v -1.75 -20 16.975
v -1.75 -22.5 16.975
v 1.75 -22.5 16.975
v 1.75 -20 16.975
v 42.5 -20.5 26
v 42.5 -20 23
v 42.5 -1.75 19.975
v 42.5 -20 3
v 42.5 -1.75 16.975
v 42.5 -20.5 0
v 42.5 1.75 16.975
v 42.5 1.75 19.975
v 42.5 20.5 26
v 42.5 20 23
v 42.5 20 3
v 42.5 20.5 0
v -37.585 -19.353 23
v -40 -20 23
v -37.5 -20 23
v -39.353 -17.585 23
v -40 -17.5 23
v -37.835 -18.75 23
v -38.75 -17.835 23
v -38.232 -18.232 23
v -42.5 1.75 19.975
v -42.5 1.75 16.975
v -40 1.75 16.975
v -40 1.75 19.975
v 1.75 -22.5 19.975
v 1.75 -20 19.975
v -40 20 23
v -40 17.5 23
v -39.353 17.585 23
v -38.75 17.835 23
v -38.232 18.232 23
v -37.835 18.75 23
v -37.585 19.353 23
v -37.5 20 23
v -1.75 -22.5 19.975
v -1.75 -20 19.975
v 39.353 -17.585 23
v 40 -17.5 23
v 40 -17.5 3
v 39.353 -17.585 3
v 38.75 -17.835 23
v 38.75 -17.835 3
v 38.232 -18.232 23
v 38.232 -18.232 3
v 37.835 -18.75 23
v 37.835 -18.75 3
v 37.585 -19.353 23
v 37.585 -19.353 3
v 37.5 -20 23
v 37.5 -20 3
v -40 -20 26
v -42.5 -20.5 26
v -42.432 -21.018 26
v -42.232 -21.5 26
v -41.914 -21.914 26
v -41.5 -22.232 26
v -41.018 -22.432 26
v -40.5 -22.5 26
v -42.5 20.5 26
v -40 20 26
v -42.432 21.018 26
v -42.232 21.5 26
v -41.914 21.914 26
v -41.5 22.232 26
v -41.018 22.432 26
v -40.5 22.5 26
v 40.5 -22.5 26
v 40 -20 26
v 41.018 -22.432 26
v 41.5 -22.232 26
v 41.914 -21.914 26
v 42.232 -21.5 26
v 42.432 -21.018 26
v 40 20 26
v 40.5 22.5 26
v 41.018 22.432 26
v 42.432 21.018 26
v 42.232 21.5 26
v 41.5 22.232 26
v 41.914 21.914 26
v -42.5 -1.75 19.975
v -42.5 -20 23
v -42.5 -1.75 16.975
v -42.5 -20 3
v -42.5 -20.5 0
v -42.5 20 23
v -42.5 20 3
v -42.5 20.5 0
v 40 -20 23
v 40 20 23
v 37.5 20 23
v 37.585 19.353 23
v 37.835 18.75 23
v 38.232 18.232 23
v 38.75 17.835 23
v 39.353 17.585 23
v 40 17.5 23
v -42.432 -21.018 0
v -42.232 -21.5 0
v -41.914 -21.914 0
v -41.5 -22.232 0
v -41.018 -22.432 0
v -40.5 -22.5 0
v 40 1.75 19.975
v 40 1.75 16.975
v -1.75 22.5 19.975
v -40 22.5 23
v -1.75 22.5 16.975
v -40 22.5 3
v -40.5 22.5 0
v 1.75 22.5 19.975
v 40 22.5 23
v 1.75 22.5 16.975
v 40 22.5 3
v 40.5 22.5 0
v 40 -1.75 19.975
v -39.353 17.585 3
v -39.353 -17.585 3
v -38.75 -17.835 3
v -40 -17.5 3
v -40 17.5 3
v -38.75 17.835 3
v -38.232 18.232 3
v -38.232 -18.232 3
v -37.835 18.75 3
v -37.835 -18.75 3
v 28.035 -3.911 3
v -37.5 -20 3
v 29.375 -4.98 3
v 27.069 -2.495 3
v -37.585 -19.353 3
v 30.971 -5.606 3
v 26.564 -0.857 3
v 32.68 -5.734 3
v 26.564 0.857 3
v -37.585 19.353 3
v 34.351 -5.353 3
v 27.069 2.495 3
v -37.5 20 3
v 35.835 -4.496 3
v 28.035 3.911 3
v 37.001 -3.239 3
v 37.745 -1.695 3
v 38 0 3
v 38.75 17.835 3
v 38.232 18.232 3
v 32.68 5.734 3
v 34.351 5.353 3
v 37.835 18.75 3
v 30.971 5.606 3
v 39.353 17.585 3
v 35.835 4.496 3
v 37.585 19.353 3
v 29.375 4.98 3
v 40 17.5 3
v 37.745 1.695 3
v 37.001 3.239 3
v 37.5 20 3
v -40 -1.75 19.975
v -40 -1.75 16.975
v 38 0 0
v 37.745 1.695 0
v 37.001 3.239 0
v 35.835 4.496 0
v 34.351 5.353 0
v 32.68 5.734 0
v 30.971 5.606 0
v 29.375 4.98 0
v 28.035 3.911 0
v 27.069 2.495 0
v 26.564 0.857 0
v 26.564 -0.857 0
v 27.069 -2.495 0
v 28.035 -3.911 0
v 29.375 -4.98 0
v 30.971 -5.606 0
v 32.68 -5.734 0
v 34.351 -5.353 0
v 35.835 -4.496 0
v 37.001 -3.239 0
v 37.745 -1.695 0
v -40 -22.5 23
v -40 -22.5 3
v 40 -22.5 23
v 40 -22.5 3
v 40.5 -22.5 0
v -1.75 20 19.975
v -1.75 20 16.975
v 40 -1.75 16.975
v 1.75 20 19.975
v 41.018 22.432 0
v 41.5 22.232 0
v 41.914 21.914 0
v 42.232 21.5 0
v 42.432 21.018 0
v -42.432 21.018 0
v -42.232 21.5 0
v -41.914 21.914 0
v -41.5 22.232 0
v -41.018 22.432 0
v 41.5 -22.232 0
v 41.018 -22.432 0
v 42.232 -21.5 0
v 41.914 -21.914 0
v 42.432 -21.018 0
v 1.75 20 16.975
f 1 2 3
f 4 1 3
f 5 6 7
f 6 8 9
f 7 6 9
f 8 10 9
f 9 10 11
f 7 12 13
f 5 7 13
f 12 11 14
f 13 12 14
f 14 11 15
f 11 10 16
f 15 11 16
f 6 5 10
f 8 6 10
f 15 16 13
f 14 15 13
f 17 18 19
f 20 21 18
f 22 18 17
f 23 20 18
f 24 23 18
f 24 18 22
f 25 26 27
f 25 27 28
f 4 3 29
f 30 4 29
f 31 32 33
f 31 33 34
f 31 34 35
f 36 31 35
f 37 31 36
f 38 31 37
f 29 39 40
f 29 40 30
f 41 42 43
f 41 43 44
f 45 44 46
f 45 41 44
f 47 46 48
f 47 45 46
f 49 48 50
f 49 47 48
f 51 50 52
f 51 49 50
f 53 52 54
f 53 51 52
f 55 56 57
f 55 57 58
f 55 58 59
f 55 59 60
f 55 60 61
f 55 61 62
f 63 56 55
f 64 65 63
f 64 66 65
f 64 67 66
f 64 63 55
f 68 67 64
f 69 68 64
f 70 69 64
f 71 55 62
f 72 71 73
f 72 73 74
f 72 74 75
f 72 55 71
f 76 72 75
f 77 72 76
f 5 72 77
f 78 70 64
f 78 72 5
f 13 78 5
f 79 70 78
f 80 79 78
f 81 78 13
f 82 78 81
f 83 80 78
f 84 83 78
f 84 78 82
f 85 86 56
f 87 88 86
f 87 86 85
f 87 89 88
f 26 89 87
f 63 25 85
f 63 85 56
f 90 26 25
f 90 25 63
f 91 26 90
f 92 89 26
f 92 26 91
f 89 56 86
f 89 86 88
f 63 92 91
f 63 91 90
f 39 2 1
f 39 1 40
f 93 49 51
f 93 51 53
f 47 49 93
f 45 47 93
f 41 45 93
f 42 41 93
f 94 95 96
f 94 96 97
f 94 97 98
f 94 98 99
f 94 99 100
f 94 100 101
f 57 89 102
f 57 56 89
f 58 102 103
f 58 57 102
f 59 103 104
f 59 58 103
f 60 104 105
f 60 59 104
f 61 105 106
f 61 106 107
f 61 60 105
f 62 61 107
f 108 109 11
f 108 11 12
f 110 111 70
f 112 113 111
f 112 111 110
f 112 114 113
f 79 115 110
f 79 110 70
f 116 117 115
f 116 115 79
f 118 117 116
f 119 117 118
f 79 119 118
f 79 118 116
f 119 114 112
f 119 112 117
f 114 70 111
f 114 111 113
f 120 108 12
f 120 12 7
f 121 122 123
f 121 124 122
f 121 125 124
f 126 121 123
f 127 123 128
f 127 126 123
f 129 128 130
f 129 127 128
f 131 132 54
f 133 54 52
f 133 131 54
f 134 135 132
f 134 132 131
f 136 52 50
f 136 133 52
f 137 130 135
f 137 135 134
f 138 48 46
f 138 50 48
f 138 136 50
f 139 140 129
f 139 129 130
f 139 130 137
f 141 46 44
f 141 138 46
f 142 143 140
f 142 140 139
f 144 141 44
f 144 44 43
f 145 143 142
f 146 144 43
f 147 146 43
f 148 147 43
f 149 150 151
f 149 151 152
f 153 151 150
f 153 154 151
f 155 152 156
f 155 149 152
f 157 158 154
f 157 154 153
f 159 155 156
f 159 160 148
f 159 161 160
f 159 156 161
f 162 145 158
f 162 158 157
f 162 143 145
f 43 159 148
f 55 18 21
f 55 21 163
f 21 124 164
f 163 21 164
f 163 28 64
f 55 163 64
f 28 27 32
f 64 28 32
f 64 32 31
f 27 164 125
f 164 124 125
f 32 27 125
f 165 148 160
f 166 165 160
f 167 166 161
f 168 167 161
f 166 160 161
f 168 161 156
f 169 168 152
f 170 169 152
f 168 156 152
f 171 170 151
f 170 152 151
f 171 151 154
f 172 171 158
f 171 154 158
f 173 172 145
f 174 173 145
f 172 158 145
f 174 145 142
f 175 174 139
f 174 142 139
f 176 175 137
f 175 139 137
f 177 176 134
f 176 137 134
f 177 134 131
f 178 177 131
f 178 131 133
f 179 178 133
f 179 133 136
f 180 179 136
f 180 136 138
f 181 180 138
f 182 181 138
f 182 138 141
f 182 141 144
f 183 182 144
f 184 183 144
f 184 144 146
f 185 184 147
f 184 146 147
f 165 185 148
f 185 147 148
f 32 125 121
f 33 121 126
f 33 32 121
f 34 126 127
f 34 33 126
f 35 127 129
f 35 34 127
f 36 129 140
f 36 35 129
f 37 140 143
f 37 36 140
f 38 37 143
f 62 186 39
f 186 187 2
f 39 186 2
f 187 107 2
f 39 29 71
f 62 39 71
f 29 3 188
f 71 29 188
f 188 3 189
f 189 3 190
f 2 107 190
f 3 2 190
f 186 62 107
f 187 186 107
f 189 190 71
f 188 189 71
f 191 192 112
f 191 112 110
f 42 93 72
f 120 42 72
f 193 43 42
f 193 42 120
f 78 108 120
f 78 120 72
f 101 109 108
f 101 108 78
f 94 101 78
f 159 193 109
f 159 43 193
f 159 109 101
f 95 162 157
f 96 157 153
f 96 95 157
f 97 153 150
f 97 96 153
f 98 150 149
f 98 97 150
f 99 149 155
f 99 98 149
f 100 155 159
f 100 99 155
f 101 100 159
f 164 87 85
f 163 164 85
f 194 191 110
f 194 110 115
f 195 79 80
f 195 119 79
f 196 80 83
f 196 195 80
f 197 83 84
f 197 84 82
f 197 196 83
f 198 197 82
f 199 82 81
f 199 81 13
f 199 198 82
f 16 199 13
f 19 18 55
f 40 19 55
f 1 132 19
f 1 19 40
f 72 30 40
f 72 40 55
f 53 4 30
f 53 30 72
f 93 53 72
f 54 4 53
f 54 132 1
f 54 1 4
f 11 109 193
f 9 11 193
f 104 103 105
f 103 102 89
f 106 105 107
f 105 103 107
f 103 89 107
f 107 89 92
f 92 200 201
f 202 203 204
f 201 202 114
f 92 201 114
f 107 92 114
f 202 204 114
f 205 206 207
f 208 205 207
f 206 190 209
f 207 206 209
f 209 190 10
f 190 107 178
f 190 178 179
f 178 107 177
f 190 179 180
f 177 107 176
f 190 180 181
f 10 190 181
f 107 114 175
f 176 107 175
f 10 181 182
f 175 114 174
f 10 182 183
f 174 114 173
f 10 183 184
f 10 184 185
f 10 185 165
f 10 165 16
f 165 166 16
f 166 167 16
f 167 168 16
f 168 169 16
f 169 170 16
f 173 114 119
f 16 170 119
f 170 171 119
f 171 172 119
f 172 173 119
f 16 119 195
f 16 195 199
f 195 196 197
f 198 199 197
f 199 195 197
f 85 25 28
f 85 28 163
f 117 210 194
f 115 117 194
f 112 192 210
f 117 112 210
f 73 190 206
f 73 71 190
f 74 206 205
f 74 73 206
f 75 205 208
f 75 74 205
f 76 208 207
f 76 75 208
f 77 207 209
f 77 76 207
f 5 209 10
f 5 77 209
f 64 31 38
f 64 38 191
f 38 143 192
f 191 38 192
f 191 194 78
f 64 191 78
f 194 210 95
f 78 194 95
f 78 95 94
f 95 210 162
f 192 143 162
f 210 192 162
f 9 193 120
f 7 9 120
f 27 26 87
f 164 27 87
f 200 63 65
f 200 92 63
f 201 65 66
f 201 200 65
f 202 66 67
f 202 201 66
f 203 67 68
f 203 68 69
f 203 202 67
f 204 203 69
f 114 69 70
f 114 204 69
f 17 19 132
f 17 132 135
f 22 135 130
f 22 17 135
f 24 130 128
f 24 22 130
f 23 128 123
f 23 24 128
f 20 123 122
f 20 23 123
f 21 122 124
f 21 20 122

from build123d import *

# Parameters (mm, degrees)
F0_W      = 85
F0_H      = 45
F0_W_2    = 80
F0_H_2    = 40
F1_DEPTH  = 3
F2_DEPTH  = 26
F4_R      = 2.5
F5_DEPTH  = 20
F6_W      = 3.5
F6_H      = 3
F7_DEPTH  = 85.001
F8_W      = 3.5
F8_H      = 3
F9_DEPTH  = 30
F10_R     = 2
F11_R     = 5.75
F12_DEPTH = 3


with BuildPart() as f1:
    # F0 (on Top) → F1 (new body)
    with BuildSketch(Plane.XY):
        Rectangle(F0_W, F0_H)
        Rectangle(F0_W_2, F0_H_2, mode=Mode.SUBTRACT)
        Rectangle(F0_W_2, F0_H_2)
    extrude(amount=F1_DEPTH)

    # F0 (on Top) → F2 (join)
    with BuildSketch(Plane.XY):
        Rectangle(F0_W, F0_H)
        Rectangle(F0_W_2, F0_H_2, mode=Mode.SUBTRACT)
    extrude(amount=F2_DEPTH)

    # F4 (on offset) → F5 (join, through all)
    with BuildSketch(Plane.XY.offset(23)):
        with Locations((-40, 20)):
            Circle(F4_R)
        with Locations((40, 20)):
            Circle(F4_R)
        with Locations((40, -20)):
            Circle(F4_R)
        with Locations((-40, -20)):
            Circle(F4_R)
    extrude(amount=-F5_DEPTH)

    # F6 (on face) → F7 (cut, through all)
    with BuildSketch(Plane(origin=(-42.5, 0, 0), x_dir=(0, -1, 0), z_dir=(-1, 0, 0))):
        with Locations((0, 18.475)):
            Rectangle(F6_W, F6_H)
    extrude(amount=-F7_DEPTH, mode=Mode.SUBTRACT)

    # F8 (on Front) → F9 (cut, symmetric)
    with BuildSketch(Plane.XZ):
        with Locations((0, 18.475)):
            Rectangle(F8_W, F8_H)
    extrude(amount=F9_DEPTH, both=True, mode=Mode.SUBTRACT)

    # F10
    f10_edges = [f1.edges().sort_by_distance(p)[0] for p in [
        (-42.5, -22.5, 13),
        (42.5, -22.5, 13),
        (-42.5, 22.5, 13),
        (42.5, 22.5, 13),
    ]]
    fillet(f10_edges, radius=F10_R)

    # F11 (on face) → F12 (cut, through all)
    with BuildSketch(Plane.XY.offset(3)):
        with Locations((32.25, 0)):
            Circle(F11_R)
    extrude(amount=-F12_DEPTH, mode=Mode.SUBTRACT)


solid = f1.part
